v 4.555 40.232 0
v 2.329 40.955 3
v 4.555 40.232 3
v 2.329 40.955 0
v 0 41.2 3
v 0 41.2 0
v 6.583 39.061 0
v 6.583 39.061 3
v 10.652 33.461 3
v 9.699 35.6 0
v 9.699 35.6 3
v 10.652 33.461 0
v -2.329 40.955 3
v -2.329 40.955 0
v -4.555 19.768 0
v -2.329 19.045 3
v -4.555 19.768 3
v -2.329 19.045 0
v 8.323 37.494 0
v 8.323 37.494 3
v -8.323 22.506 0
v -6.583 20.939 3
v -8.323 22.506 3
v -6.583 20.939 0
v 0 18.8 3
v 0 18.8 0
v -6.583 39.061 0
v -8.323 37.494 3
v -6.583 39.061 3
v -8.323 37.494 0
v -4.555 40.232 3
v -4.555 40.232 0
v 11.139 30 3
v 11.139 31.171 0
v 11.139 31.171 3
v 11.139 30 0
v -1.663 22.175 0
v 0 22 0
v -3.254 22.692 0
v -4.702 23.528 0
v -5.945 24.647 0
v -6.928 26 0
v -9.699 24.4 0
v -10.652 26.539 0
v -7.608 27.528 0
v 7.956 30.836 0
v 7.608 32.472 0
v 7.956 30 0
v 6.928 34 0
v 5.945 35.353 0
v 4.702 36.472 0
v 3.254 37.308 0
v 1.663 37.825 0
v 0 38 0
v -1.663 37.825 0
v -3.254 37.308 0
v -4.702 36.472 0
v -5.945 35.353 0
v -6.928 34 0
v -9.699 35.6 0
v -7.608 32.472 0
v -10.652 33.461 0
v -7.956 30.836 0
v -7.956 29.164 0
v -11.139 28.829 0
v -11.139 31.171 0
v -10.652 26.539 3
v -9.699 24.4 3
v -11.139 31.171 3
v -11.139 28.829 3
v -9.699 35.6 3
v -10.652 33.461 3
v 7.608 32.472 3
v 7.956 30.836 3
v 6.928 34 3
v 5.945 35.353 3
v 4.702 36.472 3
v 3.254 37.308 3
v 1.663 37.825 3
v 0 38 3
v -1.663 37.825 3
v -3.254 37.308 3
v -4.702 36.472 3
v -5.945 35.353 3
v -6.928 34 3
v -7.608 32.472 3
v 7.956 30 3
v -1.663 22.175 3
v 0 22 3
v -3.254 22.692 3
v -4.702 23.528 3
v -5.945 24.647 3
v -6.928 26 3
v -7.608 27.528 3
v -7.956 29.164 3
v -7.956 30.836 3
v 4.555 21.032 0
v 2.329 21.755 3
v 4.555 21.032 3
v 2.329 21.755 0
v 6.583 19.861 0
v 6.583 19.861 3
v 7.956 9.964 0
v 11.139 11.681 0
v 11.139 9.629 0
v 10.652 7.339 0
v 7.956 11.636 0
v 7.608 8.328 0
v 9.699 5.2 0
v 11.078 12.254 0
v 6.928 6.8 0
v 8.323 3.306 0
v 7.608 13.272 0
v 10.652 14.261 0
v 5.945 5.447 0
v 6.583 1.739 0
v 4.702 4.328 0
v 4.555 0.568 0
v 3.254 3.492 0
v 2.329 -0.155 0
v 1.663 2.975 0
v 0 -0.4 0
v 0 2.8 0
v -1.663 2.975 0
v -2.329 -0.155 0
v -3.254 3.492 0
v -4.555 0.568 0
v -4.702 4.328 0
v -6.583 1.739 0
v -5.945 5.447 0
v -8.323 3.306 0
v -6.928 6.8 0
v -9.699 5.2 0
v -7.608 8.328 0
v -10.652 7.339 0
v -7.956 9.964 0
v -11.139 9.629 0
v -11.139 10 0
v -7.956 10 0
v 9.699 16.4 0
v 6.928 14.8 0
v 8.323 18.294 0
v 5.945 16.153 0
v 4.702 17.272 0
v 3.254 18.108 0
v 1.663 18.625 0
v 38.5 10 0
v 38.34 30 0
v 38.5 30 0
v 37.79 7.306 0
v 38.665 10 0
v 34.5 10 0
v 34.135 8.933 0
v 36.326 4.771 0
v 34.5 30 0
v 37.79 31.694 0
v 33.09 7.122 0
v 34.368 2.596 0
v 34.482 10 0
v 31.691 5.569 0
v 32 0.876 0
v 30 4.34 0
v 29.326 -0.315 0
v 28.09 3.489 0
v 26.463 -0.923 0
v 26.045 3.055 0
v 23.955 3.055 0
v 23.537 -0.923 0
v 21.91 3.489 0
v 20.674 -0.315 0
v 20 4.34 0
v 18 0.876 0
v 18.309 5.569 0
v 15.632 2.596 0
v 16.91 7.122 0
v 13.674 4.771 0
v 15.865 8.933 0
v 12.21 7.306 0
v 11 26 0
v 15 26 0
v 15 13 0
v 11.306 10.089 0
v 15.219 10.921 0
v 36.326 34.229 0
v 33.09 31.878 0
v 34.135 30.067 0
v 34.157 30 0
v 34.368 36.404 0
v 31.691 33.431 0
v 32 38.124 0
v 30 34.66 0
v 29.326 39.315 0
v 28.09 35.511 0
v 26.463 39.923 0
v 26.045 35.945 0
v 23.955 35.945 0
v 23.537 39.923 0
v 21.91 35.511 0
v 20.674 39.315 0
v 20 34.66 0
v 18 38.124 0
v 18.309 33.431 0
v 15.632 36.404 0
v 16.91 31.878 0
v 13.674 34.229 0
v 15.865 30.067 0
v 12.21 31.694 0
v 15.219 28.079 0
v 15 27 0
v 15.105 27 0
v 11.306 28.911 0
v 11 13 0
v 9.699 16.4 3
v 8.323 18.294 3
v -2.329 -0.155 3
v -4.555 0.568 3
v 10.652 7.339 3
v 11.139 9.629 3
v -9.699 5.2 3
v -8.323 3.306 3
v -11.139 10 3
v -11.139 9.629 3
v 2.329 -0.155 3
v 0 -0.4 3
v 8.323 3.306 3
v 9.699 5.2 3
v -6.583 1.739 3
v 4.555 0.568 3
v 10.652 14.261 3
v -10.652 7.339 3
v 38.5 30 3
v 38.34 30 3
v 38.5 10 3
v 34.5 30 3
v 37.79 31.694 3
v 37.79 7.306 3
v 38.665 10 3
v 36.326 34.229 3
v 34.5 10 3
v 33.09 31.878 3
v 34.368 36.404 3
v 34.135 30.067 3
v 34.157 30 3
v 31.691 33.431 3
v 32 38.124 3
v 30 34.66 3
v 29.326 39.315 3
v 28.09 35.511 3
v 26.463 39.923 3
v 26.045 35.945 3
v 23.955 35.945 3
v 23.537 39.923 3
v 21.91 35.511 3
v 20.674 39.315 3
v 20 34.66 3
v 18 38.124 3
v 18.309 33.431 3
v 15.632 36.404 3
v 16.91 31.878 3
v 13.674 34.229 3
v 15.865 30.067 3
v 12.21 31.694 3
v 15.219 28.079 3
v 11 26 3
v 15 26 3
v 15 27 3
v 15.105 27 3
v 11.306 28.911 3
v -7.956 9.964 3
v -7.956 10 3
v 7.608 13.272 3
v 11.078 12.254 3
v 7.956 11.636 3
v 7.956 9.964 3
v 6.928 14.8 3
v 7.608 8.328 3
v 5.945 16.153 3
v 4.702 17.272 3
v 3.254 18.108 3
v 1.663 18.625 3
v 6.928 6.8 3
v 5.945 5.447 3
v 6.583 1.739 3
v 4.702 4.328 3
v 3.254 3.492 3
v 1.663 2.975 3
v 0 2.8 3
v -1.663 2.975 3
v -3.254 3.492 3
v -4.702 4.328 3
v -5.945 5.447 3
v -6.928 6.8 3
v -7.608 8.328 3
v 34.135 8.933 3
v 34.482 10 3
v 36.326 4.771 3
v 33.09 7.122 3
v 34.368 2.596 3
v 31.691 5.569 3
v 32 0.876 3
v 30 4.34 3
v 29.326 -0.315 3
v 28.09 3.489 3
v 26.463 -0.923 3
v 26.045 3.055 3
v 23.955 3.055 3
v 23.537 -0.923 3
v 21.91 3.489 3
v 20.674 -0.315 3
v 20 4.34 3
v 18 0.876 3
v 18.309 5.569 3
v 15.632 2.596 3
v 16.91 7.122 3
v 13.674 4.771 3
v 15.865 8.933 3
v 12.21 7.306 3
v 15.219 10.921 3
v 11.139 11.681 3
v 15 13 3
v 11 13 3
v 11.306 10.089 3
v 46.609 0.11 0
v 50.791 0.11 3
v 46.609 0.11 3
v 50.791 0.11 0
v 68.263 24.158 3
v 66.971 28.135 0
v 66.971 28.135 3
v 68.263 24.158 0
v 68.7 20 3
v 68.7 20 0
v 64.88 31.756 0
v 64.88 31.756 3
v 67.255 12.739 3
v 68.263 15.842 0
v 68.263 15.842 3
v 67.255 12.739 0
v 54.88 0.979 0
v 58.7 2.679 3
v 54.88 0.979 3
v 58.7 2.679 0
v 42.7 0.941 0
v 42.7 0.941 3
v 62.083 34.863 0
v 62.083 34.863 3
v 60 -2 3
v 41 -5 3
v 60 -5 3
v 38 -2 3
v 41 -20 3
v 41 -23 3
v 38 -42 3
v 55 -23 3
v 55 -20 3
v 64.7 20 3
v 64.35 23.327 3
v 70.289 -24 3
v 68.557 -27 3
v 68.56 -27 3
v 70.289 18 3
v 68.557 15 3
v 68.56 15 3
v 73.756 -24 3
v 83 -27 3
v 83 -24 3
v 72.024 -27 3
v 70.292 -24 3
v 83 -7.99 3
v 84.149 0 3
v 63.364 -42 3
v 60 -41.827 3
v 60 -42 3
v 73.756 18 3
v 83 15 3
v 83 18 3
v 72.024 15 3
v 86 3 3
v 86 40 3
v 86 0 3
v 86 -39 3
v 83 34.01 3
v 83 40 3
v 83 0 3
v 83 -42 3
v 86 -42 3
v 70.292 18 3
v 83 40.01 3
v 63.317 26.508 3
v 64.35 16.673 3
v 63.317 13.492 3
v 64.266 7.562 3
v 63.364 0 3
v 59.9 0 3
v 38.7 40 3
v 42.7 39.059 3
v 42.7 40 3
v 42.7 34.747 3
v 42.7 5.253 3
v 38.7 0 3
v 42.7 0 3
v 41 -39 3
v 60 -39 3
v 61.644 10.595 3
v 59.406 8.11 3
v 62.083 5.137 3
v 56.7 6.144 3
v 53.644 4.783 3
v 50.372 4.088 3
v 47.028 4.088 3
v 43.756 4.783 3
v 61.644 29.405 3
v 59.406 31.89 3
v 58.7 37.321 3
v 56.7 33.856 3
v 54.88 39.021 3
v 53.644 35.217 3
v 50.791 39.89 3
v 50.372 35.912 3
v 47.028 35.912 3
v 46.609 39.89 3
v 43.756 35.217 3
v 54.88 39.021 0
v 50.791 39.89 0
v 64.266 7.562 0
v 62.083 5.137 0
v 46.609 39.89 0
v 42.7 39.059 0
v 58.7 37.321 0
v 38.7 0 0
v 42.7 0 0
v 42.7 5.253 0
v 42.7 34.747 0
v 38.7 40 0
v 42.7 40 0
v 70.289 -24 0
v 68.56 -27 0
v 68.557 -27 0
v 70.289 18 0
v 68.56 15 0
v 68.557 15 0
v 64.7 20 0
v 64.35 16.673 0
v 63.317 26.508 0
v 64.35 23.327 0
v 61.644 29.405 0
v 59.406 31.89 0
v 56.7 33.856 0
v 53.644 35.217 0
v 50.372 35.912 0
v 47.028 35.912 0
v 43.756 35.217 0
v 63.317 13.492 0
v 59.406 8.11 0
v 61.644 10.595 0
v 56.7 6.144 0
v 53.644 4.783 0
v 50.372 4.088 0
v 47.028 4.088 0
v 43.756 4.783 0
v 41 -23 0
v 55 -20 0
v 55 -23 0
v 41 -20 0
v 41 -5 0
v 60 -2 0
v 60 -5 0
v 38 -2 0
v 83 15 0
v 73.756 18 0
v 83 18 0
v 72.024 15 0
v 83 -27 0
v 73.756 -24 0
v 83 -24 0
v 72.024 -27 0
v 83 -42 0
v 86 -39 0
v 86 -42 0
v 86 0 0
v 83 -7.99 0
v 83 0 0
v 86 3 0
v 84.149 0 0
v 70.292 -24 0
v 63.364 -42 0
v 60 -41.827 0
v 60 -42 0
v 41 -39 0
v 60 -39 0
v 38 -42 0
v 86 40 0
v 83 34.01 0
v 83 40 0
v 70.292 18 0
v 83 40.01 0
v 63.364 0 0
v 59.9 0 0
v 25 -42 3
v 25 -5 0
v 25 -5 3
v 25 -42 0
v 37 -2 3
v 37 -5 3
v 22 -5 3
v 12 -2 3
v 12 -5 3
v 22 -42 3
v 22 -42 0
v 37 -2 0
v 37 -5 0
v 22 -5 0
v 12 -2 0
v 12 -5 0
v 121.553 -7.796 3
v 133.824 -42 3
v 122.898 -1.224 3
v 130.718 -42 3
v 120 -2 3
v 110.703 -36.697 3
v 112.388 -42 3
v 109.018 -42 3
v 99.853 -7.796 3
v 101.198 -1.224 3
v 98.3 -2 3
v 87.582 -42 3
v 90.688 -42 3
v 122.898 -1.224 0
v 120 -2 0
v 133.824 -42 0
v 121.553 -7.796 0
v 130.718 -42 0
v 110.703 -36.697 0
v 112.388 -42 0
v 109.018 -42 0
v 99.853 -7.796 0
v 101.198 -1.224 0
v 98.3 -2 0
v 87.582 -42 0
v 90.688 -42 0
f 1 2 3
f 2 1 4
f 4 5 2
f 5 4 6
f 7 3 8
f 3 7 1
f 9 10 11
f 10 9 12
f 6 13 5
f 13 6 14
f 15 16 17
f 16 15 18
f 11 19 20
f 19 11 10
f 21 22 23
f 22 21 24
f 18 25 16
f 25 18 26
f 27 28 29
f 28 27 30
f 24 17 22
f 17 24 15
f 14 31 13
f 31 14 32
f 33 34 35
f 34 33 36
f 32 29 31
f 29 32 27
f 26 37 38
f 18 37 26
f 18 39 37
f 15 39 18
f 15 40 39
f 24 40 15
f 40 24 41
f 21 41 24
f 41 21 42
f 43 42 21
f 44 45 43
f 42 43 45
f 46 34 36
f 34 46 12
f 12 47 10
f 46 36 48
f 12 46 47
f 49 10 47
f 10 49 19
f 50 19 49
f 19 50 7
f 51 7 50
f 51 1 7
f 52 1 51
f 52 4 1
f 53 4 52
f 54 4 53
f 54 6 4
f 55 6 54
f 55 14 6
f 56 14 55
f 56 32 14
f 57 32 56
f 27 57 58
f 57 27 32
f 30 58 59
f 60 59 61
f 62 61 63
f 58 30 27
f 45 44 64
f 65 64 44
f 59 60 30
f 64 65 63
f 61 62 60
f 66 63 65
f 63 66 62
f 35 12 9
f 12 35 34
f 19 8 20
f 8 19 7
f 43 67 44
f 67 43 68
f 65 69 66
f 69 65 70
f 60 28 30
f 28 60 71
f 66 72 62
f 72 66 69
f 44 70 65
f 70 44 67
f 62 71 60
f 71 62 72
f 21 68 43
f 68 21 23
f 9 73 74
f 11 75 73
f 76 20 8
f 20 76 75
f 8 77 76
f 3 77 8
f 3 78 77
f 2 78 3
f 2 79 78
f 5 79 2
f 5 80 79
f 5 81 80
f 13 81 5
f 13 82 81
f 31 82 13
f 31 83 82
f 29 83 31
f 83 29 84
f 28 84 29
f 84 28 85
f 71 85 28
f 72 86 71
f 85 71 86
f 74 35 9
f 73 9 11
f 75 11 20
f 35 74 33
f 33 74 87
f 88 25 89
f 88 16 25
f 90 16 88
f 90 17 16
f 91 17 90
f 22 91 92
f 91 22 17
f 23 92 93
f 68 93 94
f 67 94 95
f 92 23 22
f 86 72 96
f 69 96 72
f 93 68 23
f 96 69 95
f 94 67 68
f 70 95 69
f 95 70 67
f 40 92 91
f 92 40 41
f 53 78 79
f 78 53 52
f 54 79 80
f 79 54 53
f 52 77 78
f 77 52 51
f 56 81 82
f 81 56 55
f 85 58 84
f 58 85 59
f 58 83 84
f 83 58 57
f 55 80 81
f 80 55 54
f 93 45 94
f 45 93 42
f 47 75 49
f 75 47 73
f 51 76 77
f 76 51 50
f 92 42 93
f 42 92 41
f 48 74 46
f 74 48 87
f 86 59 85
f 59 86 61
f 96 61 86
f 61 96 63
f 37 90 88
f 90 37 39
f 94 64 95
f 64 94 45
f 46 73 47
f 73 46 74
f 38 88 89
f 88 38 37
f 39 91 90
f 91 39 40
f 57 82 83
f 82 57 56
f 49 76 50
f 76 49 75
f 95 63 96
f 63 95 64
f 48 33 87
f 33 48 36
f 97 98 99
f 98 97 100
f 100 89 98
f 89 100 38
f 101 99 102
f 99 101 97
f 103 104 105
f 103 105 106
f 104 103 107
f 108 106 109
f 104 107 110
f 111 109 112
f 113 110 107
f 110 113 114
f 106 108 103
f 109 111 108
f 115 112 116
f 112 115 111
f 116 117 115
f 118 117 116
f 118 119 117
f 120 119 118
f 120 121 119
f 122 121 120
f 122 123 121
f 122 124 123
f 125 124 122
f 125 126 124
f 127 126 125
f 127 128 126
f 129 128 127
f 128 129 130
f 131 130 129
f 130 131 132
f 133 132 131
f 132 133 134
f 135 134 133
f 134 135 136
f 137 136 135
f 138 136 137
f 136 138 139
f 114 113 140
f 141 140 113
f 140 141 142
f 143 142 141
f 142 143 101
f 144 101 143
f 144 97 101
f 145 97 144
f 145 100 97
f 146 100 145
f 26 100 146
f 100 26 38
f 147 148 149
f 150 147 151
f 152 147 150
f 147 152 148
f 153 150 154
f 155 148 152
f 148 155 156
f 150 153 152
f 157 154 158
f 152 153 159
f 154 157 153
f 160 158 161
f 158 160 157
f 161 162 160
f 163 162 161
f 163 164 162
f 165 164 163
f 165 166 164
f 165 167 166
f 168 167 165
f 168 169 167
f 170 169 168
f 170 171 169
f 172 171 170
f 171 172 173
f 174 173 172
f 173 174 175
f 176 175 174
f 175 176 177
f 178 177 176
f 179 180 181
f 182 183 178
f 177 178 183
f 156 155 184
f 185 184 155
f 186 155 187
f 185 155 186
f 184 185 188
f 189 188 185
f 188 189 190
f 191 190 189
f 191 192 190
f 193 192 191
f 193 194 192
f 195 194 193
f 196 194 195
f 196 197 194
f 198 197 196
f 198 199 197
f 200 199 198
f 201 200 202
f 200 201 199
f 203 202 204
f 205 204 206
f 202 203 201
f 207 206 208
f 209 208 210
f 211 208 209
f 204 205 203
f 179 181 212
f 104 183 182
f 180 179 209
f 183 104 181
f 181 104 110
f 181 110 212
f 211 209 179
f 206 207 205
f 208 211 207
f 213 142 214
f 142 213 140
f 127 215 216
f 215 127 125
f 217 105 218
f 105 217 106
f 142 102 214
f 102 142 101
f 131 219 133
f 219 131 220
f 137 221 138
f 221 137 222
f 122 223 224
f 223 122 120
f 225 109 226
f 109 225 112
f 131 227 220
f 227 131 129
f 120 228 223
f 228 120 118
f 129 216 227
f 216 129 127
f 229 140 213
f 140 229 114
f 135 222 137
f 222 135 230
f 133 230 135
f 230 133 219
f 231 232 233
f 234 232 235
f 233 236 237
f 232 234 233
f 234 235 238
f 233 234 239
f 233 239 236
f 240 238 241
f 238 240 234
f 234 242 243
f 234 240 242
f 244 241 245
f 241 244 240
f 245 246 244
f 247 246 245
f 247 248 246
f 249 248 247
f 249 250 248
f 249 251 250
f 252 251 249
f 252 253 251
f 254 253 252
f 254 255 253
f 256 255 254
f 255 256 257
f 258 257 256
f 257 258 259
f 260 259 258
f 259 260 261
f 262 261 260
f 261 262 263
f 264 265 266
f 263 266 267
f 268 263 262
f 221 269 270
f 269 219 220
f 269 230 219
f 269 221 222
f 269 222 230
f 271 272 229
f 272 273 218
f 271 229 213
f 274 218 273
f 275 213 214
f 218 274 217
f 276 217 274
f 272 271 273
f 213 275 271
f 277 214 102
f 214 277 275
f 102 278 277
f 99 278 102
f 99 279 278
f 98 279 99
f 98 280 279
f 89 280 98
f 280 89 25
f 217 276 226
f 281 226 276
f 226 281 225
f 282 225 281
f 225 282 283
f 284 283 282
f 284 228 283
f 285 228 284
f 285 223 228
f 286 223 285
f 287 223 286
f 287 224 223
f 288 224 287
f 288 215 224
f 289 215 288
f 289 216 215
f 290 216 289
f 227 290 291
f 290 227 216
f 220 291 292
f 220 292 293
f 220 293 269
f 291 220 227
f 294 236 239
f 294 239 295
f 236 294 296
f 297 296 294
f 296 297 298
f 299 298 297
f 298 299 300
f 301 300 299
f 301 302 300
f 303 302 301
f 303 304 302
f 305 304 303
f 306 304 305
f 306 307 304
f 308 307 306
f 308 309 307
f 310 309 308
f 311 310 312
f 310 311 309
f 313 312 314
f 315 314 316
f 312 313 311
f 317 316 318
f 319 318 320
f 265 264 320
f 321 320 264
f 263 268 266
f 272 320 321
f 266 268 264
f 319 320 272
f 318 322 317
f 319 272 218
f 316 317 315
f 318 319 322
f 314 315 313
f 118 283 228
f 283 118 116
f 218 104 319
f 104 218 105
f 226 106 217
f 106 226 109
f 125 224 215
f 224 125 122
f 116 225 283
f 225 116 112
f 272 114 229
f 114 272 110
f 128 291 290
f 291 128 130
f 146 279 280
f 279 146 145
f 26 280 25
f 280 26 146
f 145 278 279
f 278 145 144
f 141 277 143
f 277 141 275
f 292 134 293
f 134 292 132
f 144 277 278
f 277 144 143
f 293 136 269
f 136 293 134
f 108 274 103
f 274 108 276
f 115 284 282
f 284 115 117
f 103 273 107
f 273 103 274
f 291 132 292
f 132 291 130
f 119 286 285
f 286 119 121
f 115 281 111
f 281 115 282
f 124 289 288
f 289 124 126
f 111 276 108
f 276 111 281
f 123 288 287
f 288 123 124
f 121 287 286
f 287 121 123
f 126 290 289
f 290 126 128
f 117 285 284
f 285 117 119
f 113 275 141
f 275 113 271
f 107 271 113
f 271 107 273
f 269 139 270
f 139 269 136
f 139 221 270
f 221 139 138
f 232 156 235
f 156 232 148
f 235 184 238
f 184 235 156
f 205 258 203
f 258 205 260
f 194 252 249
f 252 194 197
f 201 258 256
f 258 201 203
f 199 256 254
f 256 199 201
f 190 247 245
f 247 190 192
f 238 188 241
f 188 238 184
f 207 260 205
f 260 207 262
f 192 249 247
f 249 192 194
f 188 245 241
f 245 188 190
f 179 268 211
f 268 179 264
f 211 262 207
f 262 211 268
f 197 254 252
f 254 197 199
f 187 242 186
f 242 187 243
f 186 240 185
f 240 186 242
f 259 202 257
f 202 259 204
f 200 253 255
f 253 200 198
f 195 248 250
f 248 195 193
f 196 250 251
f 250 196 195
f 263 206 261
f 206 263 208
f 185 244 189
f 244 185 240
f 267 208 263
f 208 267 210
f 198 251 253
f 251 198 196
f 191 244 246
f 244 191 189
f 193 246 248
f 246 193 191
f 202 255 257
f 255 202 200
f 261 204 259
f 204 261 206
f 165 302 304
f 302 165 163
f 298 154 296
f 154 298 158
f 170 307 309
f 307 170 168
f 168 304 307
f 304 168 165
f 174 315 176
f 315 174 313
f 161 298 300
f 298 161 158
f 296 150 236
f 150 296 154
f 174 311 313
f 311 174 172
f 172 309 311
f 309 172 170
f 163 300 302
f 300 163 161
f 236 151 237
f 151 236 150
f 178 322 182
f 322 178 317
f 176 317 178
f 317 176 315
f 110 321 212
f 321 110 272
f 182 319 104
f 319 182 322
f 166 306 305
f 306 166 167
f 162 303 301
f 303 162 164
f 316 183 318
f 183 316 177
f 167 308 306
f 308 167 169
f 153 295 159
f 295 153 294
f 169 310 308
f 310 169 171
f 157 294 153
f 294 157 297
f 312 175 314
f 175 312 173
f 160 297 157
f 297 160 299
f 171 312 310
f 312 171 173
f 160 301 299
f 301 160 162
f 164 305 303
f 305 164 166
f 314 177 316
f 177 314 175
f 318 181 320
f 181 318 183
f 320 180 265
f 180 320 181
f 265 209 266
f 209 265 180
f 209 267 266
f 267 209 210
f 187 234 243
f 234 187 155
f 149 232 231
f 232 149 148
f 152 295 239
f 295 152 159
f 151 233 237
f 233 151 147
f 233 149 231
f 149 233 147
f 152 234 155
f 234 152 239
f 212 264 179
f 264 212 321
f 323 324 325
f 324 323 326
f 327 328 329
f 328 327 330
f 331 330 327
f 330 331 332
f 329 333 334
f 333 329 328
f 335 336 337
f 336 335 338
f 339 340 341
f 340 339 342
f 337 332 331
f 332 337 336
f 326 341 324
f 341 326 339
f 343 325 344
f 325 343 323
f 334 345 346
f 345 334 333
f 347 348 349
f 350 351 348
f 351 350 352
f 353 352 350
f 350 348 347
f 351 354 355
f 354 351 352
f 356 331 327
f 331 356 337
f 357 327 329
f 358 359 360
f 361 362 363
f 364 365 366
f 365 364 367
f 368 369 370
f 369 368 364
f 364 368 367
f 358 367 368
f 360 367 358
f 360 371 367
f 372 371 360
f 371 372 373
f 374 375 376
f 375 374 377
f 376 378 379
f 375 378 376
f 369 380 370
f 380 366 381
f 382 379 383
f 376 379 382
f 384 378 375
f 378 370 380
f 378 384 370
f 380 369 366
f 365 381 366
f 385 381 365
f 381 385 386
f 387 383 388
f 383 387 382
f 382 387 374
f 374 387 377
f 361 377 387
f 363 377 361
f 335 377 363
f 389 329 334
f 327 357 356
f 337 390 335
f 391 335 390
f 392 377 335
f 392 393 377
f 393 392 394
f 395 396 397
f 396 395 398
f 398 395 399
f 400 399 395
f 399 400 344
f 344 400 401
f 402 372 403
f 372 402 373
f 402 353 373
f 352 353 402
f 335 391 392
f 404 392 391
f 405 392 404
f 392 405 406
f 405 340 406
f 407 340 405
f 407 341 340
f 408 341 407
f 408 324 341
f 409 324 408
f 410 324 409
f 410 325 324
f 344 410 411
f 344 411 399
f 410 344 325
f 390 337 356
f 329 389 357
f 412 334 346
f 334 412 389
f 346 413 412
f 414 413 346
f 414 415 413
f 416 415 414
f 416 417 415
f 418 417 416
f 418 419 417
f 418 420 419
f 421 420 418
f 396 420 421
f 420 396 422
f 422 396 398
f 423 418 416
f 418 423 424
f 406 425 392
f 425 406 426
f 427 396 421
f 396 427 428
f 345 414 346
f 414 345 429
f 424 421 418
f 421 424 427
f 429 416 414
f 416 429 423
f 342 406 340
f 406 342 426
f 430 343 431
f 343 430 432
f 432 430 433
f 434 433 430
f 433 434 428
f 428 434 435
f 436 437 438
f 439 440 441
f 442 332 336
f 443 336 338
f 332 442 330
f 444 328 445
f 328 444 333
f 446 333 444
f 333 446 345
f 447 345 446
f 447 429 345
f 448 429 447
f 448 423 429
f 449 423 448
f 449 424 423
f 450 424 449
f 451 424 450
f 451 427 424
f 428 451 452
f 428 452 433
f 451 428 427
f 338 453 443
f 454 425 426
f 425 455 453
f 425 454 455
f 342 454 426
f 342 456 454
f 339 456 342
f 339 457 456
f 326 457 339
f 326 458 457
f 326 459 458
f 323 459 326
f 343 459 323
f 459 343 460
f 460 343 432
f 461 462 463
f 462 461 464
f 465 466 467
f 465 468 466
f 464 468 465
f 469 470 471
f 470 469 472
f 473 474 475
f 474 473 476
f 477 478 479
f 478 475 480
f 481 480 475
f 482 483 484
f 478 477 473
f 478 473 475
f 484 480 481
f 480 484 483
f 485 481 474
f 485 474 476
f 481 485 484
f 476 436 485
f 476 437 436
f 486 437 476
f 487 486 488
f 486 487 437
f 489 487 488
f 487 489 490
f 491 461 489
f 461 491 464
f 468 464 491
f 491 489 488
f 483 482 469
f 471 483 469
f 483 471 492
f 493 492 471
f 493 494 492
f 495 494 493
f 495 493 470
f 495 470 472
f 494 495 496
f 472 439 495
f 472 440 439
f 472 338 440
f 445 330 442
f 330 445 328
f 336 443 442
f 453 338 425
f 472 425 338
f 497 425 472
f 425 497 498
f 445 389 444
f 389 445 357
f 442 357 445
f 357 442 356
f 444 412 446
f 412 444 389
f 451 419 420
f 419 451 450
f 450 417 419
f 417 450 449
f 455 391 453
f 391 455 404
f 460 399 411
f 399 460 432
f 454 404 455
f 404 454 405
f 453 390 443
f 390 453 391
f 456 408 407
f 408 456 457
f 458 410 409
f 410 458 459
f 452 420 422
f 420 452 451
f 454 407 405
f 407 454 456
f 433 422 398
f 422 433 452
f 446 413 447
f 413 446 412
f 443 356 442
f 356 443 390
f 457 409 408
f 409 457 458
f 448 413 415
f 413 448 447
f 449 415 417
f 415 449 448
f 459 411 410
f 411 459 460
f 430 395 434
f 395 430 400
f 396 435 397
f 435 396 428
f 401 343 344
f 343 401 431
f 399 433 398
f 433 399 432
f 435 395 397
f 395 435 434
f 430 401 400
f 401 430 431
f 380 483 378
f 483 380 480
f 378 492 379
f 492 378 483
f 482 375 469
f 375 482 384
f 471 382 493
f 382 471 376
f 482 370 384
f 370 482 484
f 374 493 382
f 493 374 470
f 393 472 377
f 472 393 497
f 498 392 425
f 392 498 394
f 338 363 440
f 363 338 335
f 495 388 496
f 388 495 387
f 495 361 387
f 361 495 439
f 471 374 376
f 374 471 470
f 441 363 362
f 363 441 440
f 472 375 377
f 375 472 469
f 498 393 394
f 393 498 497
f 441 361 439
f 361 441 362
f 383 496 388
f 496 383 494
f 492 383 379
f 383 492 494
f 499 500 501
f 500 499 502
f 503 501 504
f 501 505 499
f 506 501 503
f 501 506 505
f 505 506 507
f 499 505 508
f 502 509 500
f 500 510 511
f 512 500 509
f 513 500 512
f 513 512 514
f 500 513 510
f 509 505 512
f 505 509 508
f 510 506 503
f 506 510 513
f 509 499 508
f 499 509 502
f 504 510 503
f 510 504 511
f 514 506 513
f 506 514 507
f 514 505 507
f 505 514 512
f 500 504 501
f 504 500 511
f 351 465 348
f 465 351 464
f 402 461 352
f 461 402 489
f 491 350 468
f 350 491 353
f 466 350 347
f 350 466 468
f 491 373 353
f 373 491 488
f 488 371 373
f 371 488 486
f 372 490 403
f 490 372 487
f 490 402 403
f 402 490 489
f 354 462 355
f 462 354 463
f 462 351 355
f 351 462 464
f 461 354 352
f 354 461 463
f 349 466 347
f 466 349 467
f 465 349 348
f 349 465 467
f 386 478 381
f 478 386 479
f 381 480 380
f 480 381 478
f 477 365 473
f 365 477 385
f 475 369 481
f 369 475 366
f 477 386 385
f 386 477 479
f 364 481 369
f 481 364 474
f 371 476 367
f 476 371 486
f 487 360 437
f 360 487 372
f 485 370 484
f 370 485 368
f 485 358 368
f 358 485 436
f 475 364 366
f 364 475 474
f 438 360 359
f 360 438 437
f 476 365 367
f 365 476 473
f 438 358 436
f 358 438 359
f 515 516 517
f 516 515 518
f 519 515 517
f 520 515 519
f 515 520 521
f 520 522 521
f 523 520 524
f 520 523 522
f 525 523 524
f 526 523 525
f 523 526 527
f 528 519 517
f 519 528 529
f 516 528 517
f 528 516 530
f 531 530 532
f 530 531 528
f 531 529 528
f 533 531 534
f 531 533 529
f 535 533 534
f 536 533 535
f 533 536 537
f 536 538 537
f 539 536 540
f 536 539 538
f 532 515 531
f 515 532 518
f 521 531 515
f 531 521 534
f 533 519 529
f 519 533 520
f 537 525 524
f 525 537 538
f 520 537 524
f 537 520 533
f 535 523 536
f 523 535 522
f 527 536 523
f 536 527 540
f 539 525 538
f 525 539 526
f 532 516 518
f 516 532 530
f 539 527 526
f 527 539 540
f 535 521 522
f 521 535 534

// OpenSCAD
union(){

// S
 translate([0,30,3])
rotate([180,0,90]){
scale([0.8,0.8,1]){
union(){
difference(){
 cylinder(3,14,14);
translate([0,0,-1]) cylinder(5,10,10);
 translate([-20,0,-1]) cube(20);

}
}
difference(){
 translate([-24,0,0]) cylinder(3,14,14);
 translate([-24,0,-1]) cylinder(5,10,10);
 translate([-25,-20,-1]) cube(20);

}
}
}

// буква О
translate([-15,0,0])
union(){
  translate([49.5,10,0]) cube([4,20,3]);
  translate([26,13,0]) cube([4,13,3]);
difference(){
union(){
	
  difference(){
  translate([40,26,0]) cylinder(3,14,14);
  translate([40,26,-1]) cylinder(5,10,10);
  translate([33,10,-1]) cube([20,10,5]);

}

difference(){
  translate([40,13,0]) cylinder(3,14,14);
  translate([40,13,-1]) cylinder(5,10,10);
  translate([32,17,-1]) cube([19,10,5]);
  translate([40,17,-1]) cube(20);
}
}
  translate([30,13,-1]) cube([5,14,5]);
  translate([42,10,-1]) cube(20);
}
}

//D
translate([43.7,0,0]) 
union(){
   translate([-5,0,0]) cube([4,40,3]);
 difference(){
    translate([5,20,0]) cylinder(3,20,20);
     translate([5,20,-1]) cylinder(6,16,16);
      translate([-15,0,-1]) cube([10,40,6]);
}
}
 translate([83,0,0])
   union(){
      difference(){
   union(){
    cube([3,40,3]);
   translate([-23.1,0,0]) rotate([0,0,-30])  cube([3,50,3]);
   translate([-15,15,0]) cube([20,3,3]);
}
   translate([-40,-8,-1]) cube([30,8,5]);
   translate([3,3,-1]) cube([10,40,5]);
  translate([-34.65,0,-1]) rotate([0,0,-30]) cube([10,40,5]);
  translate([0,40,-1]) cube(10);
}
}  


//TEAM
 
  translate([0,-42,0]){
   translate([22,0,0])

//T 
  union(){
  union(){ 
  cube([3,40,3]);
   translate([-10,37,0]) cube([25,3,3]);
}
}

//E
  translate([38,0,0])
   union(){ 
    cube([3,40,3]);
    cube([22,3,3]);
     translate([0,19,0]) cube([17,3,3]);
     translate([0,37,0]) cube([22,3,3]);
}

//A
   translate([83,0,0])
  union(){
    difference(){
  union(){
   cube([3,40,3]);
   translate([-23.1,0,0]) rotate([0,0,-30])  cube([3,50,3]);
   translate([-15,15,0]) cube([20,3,3]);
}
  translate([-40,-8,-1]) cube([60,8,5]);
  translate([3,3,-1]) cube([10,40,5]);
  translate([-34.65,0,-1]) rotate([0,0,-30]) cube([10,40,5]);
  translate([0,42,-1]) cube(10);
}
}  


//M
translate([136,40,0])
  rotate([0,0,-90])
difference(){
union(){
  translate([0,-16,0]) rotate([0,0,15]) cube([43,3,3]);
  translate([0,-16,0]) rotate([0,0,-15]) cube([43,3,3]);

 translate([0,-37.7,0]) rotate([0,0,15]) cube([43,3,3]);

 translate([0,-37.7,0])
  rotate([0,0,-15]) cube([43,3,3]);
}
 translate([40,-60,0]) cube([5,60,6]);
}
}
}
